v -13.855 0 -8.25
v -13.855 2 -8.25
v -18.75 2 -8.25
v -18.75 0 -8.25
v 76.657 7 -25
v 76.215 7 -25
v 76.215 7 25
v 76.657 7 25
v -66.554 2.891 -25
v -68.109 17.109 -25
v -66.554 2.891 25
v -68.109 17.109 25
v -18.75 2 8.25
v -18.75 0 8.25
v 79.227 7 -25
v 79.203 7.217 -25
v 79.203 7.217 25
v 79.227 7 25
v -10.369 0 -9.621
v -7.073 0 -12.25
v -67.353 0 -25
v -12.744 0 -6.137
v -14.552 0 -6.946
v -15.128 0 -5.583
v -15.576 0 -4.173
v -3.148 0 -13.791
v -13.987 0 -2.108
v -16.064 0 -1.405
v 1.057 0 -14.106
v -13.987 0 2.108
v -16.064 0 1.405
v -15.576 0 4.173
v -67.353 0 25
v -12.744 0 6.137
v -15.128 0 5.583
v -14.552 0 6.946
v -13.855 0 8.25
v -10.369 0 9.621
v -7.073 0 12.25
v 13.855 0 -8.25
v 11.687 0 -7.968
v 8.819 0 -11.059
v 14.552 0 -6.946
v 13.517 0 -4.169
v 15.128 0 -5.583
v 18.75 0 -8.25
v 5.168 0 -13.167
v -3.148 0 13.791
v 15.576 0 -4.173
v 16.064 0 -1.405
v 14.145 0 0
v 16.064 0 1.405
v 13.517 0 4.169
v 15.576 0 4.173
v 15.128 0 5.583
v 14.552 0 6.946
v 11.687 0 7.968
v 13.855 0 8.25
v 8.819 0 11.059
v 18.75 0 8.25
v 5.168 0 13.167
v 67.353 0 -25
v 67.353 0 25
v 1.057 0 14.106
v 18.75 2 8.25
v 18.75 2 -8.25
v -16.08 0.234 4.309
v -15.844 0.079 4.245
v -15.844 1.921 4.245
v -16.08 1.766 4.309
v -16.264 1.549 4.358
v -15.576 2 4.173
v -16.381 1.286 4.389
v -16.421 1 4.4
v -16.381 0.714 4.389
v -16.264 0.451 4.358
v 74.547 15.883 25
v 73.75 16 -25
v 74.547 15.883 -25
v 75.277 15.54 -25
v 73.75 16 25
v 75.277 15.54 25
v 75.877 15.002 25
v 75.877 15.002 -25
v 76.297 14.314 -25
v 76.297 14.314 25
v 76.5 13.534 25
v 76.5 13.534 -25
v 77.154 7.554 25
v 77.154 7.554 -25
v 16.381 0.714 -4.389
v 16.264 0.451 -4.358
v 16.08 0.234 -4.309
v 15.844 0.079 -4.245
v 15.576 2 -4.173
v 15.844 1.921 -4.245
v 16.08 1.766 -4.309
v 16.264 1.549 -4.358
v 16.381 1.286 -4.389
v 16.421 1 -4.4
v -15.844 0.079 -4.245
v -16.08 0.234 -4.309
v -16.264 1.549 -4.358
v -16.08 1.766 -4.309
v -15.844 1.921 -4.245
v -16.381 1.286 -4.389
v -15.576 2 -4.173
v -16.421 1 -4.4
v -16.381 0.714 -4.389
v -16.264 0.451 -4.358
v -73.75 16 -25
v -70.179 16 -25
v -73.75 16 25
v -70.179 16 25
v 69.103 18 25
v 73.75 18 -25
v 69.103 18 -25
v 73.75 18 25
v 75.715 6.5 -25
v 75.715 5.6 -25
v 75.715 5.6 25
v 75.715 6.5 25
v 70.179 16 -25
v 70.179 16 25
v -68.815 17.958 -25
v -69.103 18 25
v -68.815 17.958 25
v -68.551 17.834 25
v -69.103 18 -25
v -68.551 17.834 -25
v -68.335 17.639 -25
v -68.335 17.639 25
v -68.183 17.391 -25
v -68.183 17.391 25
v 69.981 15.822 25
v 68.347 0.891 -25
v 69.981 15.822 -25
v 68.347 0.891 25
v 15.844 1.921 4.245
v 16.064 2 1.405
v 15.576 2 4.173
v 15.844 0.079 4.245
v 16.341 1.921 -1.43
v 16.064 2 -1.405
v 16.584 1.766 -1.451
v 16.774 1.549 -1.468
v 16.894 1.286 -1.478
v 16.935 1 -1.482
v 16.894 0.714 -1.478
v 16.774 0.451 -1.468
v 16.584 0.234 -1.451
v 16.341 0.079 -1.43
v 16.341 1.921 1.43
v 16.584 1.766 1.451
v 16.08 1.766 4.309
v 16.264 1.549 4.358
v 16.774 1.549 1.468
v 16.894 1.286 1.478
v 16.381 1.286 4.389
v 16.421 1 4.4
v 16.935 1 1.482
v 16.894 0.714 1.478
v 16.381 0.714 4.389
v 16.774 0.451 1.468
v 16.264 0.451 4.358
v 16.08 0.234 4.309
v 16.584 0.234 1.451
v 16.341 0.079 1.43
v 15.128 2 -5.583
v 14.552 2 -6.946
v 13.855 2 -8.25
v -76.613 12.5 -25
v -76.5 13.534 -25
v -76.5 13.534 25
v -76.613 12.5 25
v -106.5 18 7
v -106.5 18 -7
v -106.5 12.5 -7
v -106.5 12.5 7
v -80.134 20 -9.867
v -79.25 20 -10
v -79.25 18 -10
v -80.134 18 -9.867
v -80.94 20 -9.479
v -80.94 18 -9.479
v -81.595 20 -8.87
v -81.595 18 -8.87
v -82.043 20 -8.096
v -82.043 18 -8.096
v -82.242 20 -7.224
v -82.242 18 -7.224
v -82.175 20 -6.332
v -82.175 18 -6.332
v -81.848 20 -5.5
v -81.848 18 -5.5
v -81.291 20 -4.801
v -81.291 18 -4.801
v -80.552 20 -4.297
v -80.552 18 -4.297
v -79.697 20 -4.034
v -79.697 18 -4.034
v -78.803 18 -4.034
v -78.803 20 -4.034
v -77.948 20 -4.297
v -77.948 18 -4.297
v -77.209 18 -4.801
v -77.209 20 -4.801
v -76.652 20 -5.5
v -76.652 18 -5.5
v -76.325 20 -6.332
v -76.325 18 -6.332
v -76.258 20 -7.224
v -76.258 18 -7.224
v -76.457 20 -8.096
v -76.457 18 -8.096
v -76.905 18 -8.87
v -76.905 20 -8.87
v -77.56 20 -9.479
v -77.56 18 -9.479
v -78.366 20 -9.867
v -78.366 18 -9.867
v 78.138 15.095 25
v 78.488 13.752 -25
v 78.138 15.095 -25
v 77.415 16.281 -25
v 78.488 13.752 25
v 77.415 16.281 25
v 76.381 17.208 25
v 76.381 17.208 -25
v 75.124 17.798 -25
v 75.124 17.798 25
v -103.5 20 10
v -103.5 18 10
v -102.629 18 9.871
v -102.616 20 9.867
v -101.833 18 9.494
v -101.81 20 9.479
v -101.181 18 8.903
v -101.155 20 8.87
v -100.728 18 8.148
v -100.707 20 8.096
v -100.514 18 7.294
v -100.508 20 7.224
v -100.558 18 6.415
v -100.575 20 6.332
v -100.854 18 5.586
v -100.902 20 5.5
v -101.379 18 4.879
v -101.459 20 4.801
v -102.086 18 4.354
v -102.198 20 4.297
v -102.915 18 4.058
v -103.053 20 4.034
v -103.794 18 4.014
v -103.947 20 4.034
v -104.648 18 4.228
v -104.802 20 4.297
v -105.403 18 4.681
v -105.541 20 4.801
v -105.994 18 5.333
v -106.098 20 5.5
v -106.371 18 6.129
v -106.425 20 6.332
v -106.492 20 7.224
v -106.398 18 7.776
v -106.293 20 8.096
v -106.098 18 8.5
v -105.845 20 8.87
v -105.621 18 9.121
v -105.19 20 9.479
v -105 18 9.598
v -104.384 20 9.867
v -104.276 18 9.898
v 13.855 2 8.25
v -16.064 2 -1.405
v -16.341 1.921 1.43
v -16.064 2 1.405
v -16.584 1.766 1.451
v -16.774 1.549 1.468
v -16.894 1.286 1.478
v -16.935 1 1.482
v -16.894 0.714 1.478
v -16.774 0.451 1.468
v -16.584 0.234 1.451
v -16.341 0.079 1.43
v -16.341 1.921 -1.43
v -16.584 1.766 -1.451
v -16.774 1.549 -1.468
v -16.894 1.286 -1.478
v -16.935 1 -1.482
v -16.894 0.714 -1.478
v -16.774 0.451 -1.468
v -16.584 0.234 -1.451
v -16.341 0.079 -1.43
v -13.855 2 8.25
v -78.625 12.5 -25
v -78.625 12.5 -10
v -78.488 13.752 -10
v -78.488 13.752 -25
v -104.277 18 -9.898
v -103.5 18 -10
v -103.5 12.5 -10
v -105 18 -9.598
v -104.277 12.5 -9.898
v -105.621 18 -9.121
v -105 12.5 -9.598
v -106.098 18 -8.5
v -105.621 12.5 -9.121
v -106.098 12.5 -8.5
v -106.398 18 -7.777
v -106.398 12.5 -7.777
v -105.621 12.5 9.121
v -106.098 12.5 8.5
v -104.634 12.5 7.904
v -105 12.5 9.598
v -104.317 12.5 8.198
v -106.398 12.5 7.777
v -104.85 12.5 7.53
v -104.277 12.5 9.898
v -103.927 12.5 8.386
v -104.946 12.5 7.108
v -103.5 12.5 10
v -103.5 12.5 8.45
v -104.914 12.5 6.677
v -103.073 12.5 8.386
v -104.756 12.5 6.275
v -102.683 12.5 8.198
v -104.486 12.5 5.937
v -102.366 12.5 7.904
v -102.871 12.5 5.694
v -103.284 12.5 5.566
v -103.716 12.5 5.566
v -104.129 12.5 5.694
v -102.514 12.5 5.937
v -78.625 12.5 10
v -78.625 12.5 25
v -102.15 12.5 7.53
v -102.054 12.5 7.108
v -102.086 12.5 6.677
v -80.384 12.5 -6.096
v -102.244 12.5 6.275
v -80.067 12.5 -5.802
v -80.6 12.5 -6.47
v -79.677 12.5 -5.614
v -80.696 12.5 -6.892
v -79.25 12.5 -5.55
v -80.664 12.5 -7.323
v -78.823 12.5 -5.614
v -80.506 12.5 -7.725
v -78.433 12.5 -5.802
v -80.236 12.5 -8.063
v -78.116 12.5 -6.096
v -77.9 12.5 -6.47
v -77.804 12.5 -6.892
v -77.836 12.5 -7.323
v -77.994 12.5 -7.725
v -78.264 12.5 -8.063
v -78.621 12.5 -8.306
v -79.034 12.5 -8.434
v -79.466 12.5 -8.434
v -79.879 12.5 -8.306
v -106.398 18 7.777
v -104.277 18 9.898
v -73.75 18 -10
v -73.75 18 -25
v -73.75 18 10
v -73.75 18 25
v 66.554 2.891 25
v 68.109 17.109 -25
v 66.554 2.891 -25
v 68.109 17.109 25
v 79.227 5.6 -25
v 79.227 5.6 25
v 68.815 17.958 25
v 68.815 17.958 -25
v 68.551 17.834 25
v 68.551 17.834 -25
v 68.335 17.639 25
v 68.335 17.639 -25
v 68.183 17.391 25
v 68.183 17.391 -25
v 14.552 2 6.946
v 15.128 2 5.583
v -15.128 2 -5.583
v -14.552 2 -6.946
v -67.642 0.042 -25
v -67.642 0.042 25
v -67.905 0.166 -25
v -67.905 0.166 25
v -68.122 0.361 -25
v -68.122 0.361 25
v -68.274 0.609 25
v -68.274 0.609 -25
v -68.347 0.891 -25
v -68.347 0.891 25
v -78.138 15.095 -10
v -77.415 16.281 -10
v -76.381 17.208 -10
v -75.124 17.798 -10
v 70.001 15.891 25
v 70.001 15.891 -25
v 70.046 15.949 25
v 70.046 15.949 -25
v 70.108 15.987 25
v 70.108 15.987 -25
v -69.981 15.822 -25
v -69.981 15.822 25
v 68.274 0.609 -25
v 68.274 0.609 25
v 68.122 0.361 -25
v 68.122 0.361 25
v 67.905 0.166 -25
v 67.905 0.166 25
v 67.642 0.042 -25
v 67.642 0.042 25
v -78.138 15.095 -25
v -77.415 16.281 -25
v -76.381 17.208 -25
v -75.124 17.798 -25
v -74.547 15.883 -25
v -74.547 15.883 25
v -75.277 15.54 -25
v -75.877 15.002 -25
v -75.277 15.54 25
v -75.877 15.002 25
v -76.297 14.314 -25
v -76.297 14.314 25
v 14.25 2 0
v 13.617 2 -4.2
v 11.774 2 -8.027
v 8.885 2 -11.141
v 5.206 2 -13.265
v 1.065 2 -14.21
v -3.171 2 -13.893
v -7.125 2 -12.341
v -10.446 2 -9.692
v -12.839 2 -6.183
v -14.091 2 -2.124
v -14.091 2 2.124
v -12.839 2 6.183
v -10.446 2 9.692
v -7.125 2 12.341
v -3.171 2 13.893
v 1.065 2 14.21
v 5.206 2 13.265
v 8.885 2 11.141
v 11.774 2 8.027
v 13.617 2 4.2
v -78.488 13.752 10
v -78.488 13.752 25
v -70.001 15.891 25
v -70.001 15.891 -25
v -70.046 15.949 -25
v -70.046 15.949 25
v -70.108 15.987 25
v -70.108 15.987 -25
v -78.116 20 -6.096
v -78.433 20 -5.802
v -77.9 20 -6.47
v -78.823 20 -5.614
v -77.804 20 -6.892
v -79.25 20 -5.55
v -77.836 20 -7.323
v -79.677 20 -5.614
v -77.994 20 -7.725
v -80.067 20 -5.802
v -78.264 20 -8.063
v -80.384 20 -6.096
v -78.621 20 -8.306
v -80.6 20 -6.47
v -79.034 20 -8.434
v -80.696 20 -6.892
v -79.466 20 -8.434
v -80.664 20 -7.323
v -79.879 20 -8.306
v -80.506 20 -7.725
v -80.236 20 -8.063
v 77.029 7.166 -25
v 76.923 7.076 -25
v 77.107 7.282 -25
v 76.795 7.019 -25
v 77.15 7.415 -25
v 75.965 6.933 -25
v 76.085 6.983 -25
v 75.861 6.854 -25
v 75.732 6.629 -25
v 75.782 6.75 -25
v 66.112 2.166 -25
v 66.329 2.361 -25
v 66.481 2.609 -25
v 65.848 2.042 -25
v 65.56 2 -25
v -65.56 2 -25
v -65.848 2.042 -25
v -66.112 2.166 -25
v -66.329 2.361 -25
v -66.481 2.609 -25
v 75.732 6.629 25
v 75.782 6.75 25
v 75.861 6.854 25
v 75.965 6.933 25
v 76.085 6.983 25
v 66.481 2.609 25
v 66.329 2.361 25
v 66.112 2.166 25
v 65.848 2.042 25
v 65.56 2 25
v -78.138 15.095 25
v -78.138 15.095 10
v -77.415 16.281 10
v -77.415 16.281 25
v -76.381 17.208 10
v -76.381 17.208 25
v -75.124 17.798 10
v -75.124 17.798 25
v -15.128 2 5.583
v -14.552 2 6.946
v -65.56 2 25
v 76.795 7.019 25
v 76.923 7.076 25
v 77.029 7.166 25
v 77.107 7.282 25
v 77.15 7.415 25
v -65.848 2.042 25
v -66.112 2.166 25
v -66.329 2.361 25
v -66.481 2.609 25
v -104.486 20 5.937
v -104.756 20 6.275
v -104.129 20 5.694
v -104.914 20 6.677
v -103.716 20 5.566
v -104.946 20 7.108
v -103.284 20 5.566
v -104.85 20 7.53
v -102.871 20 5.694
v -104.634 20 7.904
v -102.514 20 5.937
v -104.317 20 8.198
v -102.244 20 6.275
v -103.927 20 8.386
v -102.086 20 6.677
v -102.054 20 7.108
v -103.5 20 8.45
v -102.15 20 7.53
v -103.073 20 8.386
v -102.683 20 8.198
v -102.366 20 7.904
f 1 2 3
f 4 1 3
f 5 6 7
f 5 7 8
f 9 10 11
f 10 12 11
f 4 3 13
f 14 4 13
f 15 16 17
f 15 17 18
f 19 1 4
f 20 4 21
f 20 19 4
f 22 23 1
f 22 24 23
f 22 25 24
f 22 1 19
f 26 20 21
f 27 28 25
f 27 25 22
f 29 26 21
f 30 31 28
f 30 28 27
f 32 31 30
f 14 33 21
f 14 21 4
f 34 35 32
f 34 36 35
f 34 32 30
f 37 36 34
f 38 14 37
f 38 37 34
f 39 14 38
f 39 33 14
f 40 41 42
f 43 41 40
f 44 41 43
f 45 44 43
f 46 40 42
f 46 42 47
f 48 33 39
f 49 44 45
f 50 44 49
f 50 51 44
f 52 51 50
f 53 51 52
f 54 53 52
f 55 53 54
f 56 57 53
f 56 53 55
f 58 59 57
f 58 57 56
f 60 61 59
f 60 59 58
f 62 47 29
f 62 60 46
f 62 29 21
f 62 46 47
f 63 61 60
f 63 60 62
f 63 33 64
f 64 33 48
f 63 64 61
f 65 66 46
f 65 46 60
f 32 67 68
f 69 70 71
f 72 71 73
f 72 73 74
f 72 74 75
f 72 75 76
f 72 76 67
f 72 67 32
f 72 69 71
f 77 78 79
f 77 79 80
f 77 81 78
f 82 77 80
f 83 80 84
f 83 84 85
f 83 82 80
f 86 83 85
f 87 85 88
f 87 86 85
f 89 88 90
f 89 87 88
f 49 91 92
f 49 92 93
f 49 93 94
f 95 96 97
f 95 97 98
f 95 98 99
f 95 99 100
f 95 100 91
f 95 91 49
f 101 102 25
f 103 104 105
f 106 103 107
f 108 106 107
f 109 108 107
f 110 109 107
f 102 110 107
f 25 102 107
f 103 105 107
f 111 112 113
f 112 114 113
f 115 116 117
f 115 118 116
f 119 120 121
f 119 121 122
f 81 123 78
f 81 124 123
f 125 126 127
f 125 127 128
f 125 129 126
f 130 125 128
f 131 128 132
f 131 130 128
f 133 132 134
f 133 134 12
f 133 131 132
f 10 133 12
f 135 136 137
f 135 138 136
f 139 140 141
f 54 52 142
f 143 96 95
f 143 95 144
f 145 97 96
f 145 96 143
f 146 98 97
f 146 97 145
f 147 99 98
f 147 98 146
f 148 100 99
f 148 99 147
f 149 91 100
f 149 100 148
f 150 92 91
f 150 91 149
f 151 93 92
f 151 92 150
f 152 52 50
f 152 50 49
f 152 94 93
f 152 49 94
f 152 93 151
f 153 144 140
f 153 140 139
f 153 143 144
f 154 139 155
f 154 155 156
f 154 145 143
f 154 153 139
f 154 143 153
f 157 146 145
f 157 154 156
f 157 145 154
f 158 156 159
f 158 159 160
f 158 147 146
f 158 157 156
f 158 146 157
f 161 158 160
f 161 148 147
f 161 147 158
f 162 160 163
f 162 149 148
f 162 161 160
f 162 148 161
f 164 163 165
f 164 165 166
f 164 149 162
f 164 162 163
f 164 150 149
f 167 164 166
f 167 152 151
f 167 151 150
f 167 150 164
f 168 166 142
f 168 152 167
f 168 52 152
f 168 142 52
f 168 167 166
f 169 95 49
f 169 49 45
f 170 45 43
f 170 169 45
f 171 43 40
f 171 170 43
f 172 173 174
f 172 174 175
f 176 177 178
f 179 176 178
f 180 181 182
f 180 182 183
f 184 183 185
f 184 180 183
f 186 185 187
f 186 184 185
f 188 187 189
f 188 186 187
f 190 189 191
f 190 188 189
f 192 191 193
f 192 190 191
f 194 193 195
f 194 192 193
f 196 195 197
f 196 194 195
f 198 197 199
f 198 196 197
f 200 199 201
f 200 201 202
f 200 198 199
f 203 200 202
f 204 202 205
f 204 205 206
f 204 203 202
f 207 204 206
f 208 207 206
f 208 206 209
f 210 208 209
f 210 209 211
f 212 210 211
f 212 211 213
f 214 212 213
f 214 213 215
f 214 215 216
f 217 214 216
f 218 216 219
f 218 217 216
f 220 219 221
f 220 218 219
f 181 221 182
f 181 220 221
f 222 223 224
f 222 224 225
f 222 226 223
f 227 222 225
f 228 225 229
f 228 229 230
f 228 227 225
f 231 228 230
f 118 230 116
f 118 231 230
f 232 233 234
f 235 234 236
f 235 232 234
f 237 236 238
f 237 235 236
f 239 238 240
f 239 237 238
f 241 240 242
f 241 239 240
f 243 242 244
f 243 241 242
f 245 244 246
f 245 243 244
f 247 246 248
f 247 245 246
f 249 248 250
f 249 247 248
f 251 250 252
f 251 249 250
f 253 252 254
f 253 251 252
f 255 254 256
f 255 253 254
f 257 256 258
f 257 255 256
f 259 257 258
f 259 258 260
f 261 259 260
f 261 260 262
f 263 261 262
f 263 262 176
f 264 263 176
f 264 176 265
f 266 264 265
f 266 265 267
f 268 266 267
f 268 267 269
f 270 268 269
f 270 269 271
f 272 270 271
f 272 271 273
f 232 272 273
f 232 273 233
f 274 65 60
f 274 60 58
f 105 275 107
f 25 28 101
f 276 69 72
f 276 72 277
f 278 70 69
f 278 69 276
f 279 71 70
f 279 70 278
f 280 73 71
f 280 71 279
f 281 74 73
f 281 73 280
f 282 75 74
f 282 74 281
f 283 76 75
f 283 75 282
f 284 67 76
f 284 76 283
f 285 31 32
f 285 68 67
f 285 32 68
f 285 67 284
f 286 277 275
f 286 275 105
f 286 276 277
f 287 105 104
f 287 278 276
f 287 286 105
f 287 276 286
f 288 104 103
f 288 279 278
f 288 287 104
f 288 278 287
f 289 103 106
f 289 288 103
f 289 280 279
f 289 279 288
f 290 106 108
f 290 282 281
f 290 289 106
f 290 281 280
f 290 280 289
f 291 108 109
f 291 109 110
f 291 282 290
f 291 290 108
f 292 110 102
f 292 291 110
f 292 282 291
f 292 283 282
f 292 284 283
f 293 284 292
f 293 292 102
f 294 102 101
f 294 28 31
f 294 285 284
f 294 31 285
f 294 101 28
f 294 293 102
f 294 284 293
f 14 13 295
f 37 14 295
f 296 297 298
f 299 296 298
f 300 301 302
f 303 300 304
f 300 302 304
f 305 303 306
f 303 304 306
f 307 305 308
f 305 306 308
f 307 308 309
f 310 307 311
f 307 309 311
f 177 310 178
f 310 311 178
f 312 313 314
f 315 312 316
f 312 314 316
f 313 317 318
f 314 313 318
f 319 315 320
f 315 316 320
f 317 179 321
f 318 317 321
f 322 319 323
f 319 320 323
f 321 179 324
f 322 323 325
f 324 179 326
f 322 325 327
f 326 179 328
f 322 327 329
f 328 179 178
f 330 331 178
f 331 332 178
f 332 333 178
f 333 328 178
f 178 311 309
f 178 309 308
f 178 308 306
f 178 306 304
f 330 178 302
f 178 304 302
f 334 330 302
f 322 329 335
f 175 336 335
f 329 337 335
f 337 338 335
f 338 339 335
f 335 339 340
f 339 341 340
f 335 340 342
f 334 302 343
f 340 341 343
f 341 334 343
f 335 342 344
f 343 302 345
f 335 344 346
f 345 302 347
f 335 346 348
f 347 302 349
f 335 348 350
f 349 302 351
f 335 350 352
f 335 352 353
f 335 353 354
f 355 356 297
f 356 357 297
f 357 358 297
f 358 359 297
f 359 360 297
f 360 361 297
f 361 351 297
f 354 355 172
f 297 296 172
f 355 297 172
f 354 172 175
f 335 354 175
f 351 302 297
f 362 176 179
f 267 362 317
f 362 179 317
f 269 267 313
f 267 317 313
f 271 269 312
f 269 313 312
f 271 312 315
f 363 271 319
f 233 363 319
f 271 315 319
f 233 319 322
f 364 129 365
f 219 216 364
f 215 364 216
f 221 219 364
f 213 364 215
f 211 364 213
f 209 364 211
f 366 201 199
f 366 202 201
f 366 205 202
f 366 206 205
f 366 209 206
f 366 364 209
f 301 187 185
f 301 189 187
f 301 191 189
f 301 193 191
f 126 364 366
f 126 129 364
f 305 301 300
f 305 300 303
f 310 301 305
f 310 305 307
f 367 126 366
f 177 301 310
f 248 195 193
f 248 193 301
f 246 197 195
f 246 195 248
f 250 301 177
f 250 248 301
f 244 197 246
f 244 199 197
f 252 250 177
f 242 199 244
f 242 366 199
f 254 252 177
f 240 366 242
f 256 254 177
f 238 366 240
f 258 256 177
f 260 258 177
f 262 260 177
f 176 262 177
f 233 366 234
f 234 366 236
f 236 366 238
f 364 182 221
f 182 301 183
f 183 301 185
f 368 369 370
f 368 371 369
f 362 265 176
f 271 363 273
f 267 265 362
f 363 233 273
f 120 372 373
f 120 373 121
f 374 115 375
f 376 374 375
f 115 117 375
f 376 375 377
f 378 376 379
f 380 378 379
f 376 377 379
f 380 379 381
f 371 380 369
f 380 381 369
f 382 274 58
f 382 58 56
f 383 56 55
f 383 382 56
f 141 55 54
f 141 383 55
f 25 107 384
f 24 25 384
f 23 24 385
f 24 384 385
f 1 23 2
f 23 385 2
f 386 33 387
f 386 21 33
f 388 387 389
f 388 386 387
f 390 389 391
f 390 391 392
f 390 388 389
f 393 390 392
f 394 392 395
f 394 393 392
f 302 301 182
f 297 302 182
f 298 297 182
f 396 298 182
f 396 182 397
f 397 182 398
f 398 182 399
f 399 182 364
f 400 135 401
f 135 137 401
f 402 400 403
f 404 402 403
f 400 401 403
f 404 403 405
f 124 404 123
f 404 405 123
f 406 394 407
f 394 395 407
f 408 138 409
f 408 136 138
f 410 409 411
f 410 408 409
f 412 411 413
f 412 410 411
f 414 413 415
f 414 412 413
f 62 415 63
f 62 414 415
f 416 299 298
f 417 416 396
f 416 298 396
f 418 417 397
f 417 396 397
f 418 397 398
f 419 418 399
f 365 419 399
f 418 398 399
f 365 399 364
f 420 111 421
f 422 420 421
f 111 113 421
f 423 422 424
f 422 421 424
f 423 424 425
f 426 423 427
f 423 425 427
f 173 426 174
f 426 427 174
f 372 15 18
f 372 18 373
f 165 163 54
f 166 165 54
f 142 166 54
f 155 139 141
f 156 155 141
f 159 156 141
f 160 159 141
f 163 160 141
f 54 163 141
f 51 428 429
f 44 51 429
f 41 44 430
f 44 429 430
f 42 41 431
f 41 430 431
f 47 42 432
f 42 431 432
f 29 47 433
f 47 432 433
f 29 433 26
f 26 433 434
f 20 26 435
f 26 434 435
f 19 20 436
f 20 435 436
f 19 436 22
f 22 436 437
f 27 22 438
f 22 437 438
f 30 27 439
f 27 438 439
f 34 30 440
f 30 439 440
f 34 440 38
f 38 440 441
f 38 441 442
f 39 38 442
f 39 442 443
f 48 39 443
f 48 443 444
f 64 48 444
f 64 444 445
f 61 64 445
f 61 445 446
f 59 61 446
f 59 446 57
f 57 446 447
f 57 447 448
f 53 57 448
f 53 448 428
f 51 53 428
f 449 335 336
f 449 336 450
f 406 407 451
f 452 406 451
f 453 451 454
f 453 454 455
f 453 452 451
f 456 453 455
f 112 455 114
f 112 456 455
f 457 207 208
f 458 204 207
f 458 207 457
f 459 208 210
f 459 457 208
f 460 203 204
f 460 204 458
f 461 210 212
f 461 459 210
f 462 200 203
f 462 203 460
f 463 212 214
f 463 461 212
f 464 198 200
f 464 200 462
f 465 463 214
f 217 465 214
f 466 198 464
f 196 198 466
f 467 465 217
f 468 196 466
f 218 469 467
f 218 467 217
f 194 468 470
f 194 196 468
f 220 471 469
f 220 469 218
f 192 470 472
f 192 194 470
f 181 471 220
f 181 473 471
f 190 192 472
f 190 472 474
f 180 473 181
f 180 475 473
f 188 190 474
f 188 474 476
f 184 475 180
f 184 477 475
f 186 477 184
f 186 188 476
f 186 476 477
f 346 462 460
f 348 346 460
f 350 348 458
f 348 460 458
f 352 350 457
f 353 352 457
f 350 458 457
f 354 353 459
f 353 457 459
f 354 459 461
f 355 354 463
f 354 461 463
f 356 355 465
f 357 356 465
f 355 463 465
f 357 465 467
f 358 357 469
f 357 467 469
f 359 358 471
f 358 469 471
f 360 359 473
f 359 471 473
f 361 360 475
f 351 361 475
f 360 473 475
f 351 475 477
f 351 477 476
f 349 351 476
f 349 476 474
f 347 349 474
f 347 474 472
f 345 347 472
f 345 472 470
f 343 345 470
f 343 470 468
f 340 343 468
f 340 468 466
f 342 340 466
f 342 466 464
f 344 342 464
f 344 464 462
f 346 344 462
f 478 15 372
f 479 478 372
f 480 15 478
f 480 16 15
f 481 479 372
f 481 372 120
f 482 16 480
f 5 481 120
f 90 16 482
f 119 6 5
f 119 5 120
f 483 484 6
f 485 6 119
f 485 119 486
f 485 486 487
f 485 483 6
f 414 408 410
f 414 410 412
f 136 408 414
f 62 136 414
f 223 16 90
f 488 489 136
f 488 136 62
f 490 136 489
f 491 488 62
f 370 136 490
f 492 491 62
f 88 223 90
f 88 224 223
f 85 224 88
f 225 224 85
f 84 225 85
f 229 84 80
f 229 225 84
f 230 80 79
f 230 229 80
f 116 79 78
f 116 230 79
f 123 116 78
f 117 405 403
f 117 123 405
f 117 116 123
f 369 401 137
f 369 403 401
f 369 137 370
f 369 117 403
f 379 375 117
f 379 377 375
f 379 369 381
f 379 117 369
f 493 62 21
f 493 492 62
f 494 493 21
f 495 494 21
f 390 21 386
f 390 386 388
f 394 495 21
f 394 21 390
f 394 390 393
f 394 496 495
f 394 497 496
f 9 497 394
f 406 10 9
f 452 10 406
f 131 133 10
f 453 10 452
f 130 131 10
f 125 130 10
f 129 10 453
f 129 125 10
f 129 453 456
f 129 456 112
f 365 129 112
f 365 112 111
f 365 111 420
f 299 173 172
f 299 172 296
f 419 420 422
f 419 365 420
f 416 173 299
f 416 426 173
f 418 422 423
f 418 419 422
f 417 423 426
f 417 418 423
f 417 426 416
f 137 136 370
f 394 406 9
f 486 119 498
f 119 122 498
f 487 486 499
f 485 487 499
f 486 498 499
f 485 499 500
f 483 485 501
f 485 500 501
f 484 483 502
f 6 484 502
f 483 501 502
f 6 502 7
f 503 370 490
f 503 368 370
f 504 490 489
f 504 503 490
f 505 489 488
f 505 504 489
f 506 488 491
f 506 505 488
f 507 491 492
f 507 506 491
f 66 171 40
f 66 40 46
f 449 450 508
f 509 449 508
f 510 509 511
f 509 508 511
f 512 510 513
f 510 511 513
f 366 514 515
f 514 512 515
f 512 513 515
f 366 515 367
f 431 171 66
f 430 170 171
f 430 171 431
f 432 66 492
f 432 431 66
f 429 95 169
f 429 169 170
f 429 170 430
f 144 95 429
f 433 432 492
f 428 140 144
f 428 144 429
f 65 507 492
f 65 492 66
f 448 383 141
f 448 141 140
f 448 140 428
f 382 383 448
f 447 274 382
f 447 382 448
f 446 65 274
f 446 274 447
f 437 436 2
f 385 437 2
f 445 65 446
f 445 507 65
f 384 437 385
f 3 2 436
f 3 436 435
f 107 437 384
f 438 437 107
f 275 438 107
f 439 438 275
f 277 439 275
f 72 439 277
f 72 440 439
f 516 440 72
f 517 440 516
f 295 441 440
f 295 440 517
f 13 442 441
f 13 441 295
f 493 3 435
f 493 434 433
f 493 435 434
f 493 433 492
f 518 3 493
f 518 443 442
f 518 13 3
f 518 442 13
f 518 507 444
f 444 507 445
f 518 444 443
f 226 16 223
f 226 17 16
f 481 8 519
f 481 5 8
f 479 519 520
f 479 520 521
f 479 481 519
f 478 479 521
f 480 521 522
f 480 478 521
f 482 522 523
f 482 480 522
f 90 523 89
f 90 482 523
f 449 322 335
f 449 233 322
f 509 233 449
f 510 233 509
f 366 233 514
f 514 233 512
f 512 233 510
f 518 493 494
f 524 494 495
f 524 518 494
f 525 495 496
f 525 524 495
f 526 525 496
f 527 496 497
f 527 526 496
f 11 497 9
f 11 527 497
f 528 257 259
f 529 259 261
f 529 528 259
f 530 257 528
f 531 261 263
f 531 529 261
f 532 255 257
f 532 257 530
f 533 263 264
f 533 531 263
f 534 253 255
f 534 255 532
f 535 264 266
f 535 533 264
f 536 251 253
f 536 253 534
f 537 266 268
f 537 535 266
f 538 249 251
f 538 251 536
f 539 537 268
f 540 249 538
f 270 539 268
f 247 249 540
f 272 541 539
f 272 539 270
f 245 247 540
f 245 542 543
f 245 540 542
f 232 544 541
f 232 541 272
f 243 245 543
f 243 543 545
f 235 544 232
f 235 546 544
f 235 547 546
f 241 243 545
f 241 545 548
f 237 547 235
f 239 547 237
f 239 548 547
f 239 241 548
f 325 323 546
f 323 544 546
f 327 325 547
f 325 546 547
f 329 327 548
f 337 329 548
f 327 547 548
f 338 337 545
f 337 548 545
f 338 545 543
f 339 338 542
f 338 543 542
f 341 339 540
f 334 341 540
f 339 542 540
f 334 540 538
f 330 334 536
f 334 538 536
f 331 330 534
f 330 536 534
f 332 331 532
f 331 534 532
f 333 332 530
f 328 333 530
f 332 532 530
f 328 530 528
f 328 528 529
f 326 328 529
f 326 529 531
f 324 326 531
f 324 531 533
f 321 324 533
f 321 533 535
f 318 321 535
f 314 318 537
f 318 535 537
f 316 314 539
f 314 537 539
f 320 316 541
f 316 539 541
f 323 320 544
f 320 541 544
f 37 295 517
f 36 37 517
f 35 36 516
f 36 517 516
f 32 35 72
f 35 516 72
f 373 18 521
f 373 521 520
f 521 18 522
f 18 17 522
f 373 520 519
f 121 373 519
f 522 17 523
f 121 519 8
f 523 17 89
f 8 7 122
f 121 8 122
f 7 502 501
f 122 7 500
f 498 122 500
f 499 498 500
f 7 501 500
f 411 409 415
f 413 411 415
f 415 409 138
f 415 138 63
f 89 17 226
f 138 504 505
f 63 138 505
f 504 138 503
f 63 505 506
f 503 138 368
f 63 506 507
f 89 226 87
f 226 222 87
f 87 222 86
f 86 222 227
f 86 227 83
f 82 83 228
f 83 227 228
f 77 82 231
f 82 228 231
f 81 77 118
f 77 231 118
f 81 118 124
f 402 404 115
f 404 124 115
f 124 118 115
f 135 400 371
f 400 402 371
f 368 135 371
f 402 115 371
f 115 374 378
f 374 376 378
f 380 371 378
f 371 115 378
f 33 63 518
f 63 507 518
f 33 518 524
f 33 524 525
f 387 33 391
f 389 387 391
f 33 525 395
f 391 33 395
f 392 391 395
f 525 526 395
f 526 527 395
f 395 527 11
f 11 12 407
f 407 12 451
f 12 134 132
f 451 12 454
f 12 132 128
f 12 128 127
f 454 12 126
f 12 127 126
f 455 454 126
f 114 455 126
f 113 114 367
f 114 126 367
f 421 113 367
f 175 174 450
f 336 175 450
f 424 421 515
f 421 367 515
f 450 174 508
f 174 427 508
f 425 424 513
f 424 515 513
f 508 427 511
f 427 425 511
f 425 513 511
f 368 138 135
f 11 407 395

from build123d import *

# Parameters (mm, degrees)
BOSS_EXTRUDE1_DEPTH     = 25
SKETCH2_R               = 14.25
CUT_EXTRUDE1_DEPTH      = 50
CUT_EXTRUDE1_DRAFT      = -3
CUT_EXTRUDE2_DEPTH      = 85.581854283
REVOLVE1_ANGLE          = 30
FILLET1_R               = 0.2
FILLET4_R               = 1
BOSS_EXTRUDE2_START     = -25
BOSS_EXTRUDE2_DEPTH     = 50
FILLET5_R               = 0.5
BOSS_EXTRUDE3_DEPTH     = 10
SKETCH7_R               = 1.45
CUT_EXTRUDE3_DEPTH      = 111.865909999
BOSS_EXTRUDE5_START     = 2
SKETCH9_R               = 3
SKETCH9_R_2             = 1.45
BOSS_EXTRUDE5_DEPTH     = 2
FILLET6_R               = 3
CUT_EXTRUDE4_DEPTH      = 112.208138191
CUT_EXTRUDE4_DEPTH_BACK = 112.208138191
SKETCH10_W              = 29.886864559
SKETCH10_H              = 5.5


with BuildPart() as part:
    # Sketch1 → Boss-Extrude1 (new, symmetric)
    with BuildSketch(Plane.XY):
        with BuildLine():
            Line((0, 0), (-68.25, 0))
            Line((-68.25, 0), (-70, 16))
            Line((-70, 16), (-73.75, 16))
            ThreePointArc((-73.75, 16), (-75.596738759, 15.293339066), (-76.5, 13.534381178))
            Line((-76.5, 13.534381178), (-77.214697941, 7))
            Line((-77.214697941, 7), (-79.202841325, 7.217453183))
            Line((-79.202841325, 7.217453183), (-78.488143384, 13.75183436))
            ThreePointArc((-78.488143384, 13.75183436), (-76.931859285, 16.782450607), (-73.75, 18))
            Line((-73.75, 18), (-68.206822675, 18))
            Line((-68.206822675, 18), (-66.456822675, 2))
            Line((-66.456822675, 2), (0, 2))
            Line((0, 2), (0, 0))
        make_face()
    boss_extrude1 = extrude(amount=BOSS_EXTRUDE1_DEPTH, both=True)

    # Mirror1: Boss-Extrude1 across plane
    add(boss_extrude1.mirror(Plane(origin=(0, 0, 25), x_dir=(0, 0, 1), z_dir=(-1, 0, 0))))


with BuildPart() as cut_extrude1_tool:
    # Sketch2 → Cut-Extrude1 (with draft: the straight prism first)
    with BuildSketch(Plane(origin=(0, 2, 0), x_dir=(1, 0, 0), z_dir=(0, 1, 0))):
        Circle(SKETCH2_R)
    extrude(amount=-CUT_EXTRUDE1_DEPTH)
    # Cut-Extrude1: the draft: its side faces are tilted about the plane it starts from
    cut_extrude1_sides = [cut_extrude1_tool.faces().sort_by_distance(p)[0] for p in [
        (-14.25, -23, 0),
    ]]
    draft(cut_extrude1_sides, Plane(origin=(0, 2, 0), x_dir=(1, 0, 0), z_dir=(0, 1, 0)), CUT_EXTRUDE1_DRAFT)


with BuildPart() as part_1:
    add(part.part)

    # Cut-Extrude1: cut by cut_extrude1_tool
    add(cut_extrude1_tool.part, mode=Mode.SUBTRACT)

    # Sketch3 → Cut-Extrude2 (cut, through all)
    with BuildSketch(Plane(origin=(0, 2, 0), x_dir=(1, 0, 0), z_dir=(0, 1, 0))):
        with BuildLine():
            Line((-18.75, 8.25), (-18.75, -8.25))
            Line((-18.75, -8.25), (-13.854714901, -8.25))
            ThreePointArc((-13.854714901, -8.25), (-16.125, 0), (-13.854714901, 8.25))
            Line((-13.854714901, 8.25), (-18.75, 8.25))
        make_face()
        with BuildLine():
            Line((18.75, 8.25), (18.75, -8.25))
            Line((18.75, -8.25), (13.854714901, -8.25))
            ThreePointArc((13.854714901, -8.25), (16.125, 0), (13.854714901, 8.25))
            Line((13.854714901, 8.25), (18.75, 8.25))
        make_face()
    extrude(amount=-CUT_EXTRUDE2_DEPTH, mode=Mode.SUBTRACT)

    # Sketch4 → Revolve1 (revolve, symmetric)
    with BuildSketch(Plane.XY) as revolve1_sk:
        with BuildLine():
            Line((16.125, 0), (16.125, 2))
            ThreePointArc((16.125, 2), (17, 1), (16.125, 0))
        make_face()
    revolve1 = revolve(axis=Axis((0, 2, 0), (0, 1, 0)), revolution_arc=REVOLVE1_ANGLE / 2)
    revolve1 = revolve1 + revolve(revolve1_sk.sketch, axis=Axis((0, 2, 0), (0, -1, 0)), revolution_arc=REVOLVE1_ANGLE / 2)

    # Mirror2: Revolve1 across plane
    add(revolve1.mirror(Plane(origin=(0, 0, 0), x_dir=(0, 0, 1), z_dir=(1, 0, 0))))

    # Fillet1
    fillet1_edges = [part_1.edges().sort_by_distance(p)[0] for p in [
        (-70, 16, 0),
        (70, 16, 0),
    ]]
    fillet(fillet1_edges, radius=FILLET1_R)

    # Fillet4
    fillet4_edges = [part_1.edges().sort_by_distance(p)[0] for p in [
        (-68.25, 0, 0),
        (-68.206822675, 18, 0),
        (-66.456822675, 2, 0),
        (68.25, 0, 0),
        (68.206822675, 18, 0),
        (66.456822675, 2, 0),
    ]]
    fillet(fillet4_edges, radius=FILLET4_R)

    # Sketch6 → Boss-Extrude2 (add)
    with BuildSketch(Plane.XY.offset(BOSS_EXTRUDE2_START)):
        Polygon((79.226625267, 7), (79.226625267, 5.6), (75.714697941, 5.6), (75.714697941, 7), (77.214697941, 7), (79.202841325, 7.217453183), align=None)
    extrude(amount=BOSS_EXTRUDE2_DEPTH)

    # Fillet5
    fillet5_edges = [part_1.edges().sort_by_distance(p)[0] for p in [
        (75.714697941, 7, 0),
        (77.214697941, 7, 0),
    ]]
    fillet(fillet5_edges, radius=FILLET5_R)

    # Sketch5 → Boss-Extrude3 (add, symmetric)
    with BuildSketch(Plane.XY):
        with BuildLine():
            Line((-73.75, 18), (-106.5, 18))
            Line((-106.5, 18), (-106.5, 7))
            Line((-106.5, 7), (-77.214697941, 7))
            Line((-77.214697941, 7), (-76.5, 13.534381178))
            ThreePointArc((-76.5, 13.534381178), (-75.596738759, 15.293339066), (-73.75, 16))
            Line((-73.75, 16), (-73.75, 18))
        make_face()
    extrude(amount=BOSS_EXTRUDE3_DEPTH, both=True)

    # Sketch7 → Cut-Extrude3 (cut, through all)
    with BuildSketch(Plane(origin=(0, 18, 0), x_dir=(1, 0, 0), z_dir=(0, 1, 0))):
        with Locations(Location((-79.25, 7, 0), (0, 0, 270))):
            Circle(SKETCH7_R)
        with Locations(Location((-103.5, -7, 0), (0, 0, 270))):
            Circle(SKETCH7_R)
    extrude(amount=-CUT_EXTRUDE3_DEPTH, mode=Mode.SUBTRACT)

    # Sketch9 → Boss-Extrude5 (add)
    # profile 1 of 2: a face of its own
    with BuildSketch(Plane(origin=(0, 18, 0), x_dir=(1, 0, 0), z_dir=(0, 1, 0)).offset(BOSS_EXTRUDE5_START)):
        with Locations(Location((-79.25, 7, 0), (0, 0, 90))):
            Circle(SKETCH9_R)
        with Locations(Location((-79.25, 7, 0), (0, 0, 270))):
            Circle(SKETCH9_R_2, mode=Mode.SUBTRACT)
    # profile 2 of 2: a face of its own
    with BuildSketch(Plane(origin=(0, 18, 0), x_dir=(1, 0, 0), z_dir=(0, 1, 0)).offset(BOSS_EXTRUDE5_START)):
        with Locations(Location((-103.5, -7, 0), (0, 0, 270))):
            Circle(SKETCH9_R)
        with Locations(Location((-103.5, -7, 0), (0, 0, 270))):
            Circle(SKETCH9_R_2, mode=Mode.SUBTRACT)
    extrude(amount=-BOSS_EXTRUDE5_DEPTH)

    # Fillet6
    fillet6_edges = [part_1.edges().sort_by_distance(p)[0] for p in [
        (-106.5, 12.5, 10),
        (-106.5, 12.5, -10),
    ]]
    fillet(fillet6_edges, radius=FILLET6_R - 0.0001)  # a hair under: the kernel refuses the full size

    # Sketch10 → Cut-Extrude4 (cut, two sides: drawn at the far end of the back side and taken through both)
    with BuildSketch(Plane.XY.offset(-CUT_EXTRUDE4_DEPTH_BACK)):
        with Locations((-91.55656772, 9.75)):
            Rectangle(SKETCH10_W, SKETCH10_H)
    extrude(amount=CUT_EXTRUDE4_DEPTH + CUT_EXTRUDE4_DEPTH_BACK, mode=Mode.SUBTRACT)


solid = part_1.part
